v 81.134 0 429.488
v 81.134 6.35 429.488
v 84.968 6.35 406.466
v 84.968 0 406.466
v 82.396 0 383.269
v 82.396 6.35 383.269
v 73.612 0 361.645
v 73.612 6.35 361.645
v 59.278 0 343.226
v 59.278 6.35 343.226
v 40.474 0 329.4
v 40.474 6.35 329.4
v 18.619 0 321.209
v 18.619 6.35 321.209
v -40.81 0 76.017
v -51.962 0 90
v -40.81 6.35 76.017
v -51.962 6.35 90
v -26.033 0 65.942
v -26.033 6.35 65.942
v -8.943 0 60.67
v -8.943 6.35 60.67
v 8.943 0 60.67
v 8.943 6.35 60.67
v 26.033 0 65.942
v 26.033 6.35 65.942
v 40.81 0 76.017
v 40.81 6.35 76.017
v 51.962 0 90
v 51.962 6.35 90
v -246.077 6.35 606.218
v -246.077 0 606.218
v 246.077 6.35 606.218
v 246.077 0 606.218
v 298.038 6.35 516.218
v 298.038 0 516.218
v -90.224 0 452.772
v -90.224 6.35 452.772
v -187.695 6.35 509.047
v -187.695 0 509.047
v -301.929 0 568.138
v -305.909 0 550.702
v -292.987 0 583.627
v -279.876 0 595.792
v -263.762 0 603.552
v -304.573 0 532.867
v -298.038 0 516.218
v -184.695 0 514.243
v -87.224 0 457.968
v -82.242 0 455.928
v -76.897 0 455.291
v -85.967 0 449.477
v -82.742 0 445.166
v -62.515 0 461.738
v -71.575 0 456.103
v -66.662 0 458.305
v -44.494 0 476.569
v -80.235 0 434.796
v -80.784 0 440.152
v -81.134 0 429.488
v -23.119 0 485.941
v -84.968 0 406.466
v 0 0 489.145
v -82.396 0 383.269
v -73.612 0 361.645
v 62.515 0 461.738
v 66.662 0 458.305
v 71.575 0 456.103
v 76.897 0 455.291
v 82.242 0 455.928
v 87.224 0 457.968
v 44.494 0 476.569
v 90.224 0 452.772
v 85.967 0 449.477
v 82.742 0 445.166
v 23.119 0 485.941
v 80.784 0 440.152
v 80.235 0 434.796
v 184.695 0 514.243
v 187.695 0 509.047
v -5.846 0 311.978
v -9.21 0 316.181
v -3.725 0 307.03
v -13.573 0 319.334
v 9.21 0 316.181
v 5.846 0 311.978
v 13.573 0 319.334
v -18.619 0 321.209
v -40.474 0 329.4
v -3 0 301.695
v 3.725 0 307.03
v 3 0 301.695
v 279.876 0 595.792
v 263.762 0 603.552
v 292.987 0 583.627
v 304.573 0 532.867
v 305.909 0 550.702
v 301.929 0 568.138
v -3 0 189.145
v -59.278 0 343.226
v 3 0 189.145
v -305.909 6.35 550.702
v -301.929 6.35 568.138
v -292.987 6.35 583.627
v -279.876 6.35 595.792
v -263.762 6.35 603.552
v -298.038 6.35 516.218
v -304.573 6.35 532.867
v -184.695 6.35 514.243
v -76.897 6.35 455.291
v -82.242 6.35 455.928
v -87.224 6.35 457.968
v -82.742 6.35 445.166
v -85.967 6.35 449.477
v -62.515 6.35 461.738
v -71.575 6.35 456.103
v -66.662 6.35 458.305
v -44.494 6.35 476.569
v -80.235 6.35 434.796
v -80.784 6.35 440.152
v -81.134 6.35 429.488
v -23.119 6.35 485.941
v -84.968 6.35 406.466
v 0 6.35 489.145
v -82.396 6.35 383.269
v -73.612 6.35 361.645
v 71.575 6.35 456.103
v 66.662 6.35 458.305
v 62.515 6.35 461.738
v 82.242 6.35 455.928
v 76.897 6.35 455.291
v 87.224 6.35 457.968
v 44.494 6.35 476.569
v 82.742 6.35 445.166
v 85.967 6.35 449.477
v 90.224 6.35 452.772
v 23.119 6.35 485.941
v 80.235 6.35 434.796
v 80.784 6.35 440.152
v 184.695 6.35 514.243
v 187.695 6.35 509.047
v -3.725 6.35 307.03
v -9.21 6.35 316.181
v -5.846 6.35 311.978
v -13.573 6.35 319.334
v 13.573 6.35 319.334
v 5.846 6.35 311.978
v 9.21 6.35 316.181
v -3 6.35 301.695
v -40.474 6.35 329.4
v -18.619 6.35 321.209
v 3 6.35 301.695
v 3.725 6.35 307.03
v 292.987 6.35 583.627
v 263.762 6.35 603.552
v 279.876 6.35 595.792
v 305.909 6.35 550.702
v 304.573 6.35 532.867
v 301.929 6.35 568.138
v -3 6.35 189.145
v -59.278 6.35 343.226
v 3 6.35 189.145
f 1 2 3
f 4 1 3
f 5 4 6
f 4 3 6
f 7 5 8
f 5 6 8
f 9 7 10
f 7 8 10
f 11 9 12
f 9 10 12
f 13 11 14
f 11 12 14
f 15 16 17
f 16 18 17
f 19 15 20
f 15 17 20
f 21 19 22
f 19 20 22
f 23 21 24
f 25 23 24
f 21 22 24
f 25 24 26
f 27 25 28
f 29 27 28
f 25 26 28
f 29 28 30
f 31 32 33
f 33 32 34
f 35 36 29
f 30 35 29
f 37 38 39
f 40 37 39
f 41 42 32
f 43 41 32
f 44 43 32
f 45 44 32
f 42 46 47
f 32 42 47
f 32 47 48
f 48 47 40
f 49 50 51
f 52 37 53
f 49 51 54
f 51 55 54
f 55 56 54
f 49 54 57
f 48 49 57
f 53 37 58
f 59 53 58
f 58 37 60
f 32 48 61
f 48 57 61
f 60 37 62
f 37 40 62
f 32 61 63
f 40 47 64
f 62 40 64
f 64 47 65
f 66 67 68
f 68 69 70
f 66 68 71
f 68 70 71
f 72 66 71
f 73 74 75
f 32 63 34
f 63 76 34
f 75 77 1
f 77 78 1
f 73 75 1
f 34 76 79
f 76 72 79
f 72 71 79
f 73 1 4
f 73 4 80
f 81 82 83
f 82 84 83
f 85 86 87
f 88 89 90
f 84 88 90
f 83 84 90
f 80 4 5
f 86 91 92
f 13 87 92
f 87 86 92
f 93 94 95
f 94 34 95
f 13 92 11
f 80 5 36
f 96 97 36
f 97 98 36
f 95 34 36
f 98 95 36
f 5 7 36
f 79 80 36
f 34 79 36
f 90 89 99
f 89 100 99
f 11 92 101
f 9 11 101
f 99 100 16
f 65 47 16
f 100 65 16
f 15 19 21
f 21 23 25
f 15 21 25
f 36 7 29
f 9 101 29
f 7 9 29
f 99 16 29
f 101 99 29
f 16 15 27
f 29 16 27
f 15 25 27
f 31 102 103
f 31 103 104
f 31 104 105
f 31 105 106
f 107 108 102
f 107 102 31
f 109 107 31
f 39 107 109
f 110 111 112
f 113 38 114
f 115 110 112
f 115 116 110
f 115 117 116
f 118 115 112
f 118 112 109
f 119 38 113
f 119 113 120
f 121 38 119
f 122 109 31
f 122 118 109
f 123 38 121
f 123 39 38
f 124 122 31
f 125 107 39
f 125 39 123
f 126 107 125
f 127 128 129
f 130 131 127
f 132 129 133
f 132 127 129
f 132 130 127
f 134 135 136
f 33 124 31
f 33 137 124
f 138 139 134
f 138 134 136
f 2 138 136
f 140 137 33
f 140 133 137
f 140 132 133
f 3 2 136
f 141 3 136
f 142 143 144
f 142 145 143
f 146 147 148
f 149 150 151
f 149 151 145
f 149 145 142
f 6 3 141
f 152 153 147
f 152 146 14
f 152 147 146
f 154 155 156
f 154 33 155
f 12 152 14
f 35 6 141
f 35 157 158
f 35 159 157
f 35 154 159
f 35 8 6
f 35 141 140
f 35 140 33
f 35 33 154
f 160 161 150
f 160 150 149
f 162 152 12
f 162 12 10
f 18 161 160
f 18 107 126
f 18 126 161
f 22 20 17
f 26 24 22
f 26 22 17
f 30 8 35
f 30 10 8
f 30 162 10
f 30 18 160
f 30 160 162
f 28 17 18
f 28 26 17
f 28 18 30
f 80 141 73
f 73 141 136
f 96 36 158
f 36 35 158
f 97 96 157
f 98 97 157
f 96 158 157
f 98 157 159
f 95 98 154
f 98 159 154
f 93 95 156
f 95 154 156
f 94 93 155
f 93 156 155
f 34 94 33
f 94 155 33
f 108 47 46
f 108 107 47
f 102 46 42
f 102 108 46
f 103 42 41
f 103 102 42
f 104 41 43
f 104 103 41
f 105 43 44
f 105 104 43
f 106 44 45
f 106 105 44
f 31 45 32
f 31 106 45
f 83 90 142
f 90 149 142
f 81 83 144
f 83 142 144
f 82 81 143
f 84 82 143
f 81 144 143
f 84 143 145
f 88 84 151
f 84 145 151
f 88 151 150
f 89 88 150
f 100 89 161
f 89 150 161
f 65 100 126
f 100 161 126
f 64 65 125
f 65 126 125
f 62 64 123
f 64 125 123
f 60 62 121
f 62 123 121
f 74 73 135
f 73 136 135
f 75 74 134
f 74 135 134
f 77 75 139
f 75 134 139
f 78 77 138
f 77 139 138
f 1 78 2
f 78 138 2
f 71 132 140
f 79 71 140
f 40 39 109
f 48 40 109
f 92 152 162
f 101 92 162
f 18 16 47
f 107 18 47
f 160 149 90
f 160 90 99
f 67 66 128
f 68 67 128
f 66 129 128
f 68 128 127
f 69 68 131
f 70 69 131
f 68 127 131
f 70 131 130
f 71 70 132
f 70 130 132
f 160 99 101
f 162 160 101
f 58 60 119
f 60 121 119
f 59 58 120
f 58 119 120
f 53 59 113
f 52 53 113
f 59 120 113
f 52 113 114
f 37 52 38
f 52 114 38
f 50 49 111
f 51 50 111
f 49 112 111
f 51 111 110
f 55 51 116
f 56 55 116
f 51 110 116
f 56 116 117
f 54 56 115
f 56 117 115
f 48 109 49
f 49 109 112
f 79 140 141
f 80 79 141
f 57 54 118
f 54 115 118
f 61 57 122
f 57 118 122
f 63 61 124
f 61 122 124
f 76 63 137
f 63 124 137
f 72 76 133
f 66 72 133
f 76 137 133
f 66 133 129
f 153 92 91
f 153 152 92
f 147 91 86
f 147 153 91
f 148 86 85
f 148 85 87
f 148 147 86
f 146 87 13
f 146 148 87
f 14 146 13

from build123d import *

# Parameters (mm, degrees)
BOSS_EXTRUDE1_DEPTH = 6.35
SKETCH2_R           = 85
CUT_EXTRUDE1_DEPTH  = 6.35
FILLET1_R           = 60
SKETCH3_W           = 6
SKETCH3_H           = 185
CUT_EXTRUDE2_DEPTH  = 6.35
FILLET2_R           = 20


with BuildPart() as part:
    # Sketch1 → Boss-Extrude1 (new body)
    with BuildSketch(Plane(origin=(0, 0, 0), x_dir=(1, 0, 0), z_dir=(0, 1, 0))):
        Polygon((0, 0), (-350, -606.217782649), (350, -606.217782649), align=None)
    extrude(amount=BOSS_EXTRUDE1_DEPTH)

    # Sketch2 → Cut-Extrude1 (cut)
    with BuildSketch(Plane(origin=(0, 6.35, 0), x_dir=(1, 0, 0), z_dir=(0, 1, 0))):
        with Locations((0, -404.145188433)):
            Circle(SKETCH2_R)
    extrude(amount=-CUT_EXTRUDE1_DEPTH, mode=Mode.SUBTRACT)

    # Fillet1
    fillet1_edges = [part.edges().sort_by_distance(p)[0] for p in [
        (350, 3.175, 606.217782649),
        (-350, 3.175, 606.217782649),
        (0, 3.175, 0),
    ]]
    fillet(fillet1_edges, radius=FILLET1_R)

    # Sketch3 → Cut-Extrude2 (cut)
    with BuildSketch(Plane(origin=(0, 6.35, 0), x_dir=(1, 0, 0), z_dir=(0, 1, 0))):
        Polygon((27.480762114, -416.547112221), (24.480762114, -421.743264644), (184.695461814, -514.243264644), (187.695461814, -509.047112221), align=None)
        with Locations((0, -281.645188433)):
            Rectangle(SKETCH3_W, SKETCH3_H)
        Polygon((-24.480762114, -421.743264644), (-27.480762114, -416.547112221), (-187.695461814, -509.047112221), (-184.695461814, -514.243264644), align=None)
    extrude(amount=-CUT_EXTRUDE2_DEPTH, mode=Mode.SUBTRACT)

    # Fillet2
    fillet2_edges = [part.edges().sort_by_distance(p)[0] for p in [
        (3, 3.175, 319.198146106),
        (-3, 3.175, 319.198146106),
        (-75.066296631, 3.175, 444.020633385),
        (-72.066296631, 3.175, 449.216785807),
        (72.066296631, 3.175, 449.216785807),
        (75.066296631, 3.175, 444.020633385),
    ]]
    fillet(fillet2_edges, radius=FILLET2_R)


solid = part.part
